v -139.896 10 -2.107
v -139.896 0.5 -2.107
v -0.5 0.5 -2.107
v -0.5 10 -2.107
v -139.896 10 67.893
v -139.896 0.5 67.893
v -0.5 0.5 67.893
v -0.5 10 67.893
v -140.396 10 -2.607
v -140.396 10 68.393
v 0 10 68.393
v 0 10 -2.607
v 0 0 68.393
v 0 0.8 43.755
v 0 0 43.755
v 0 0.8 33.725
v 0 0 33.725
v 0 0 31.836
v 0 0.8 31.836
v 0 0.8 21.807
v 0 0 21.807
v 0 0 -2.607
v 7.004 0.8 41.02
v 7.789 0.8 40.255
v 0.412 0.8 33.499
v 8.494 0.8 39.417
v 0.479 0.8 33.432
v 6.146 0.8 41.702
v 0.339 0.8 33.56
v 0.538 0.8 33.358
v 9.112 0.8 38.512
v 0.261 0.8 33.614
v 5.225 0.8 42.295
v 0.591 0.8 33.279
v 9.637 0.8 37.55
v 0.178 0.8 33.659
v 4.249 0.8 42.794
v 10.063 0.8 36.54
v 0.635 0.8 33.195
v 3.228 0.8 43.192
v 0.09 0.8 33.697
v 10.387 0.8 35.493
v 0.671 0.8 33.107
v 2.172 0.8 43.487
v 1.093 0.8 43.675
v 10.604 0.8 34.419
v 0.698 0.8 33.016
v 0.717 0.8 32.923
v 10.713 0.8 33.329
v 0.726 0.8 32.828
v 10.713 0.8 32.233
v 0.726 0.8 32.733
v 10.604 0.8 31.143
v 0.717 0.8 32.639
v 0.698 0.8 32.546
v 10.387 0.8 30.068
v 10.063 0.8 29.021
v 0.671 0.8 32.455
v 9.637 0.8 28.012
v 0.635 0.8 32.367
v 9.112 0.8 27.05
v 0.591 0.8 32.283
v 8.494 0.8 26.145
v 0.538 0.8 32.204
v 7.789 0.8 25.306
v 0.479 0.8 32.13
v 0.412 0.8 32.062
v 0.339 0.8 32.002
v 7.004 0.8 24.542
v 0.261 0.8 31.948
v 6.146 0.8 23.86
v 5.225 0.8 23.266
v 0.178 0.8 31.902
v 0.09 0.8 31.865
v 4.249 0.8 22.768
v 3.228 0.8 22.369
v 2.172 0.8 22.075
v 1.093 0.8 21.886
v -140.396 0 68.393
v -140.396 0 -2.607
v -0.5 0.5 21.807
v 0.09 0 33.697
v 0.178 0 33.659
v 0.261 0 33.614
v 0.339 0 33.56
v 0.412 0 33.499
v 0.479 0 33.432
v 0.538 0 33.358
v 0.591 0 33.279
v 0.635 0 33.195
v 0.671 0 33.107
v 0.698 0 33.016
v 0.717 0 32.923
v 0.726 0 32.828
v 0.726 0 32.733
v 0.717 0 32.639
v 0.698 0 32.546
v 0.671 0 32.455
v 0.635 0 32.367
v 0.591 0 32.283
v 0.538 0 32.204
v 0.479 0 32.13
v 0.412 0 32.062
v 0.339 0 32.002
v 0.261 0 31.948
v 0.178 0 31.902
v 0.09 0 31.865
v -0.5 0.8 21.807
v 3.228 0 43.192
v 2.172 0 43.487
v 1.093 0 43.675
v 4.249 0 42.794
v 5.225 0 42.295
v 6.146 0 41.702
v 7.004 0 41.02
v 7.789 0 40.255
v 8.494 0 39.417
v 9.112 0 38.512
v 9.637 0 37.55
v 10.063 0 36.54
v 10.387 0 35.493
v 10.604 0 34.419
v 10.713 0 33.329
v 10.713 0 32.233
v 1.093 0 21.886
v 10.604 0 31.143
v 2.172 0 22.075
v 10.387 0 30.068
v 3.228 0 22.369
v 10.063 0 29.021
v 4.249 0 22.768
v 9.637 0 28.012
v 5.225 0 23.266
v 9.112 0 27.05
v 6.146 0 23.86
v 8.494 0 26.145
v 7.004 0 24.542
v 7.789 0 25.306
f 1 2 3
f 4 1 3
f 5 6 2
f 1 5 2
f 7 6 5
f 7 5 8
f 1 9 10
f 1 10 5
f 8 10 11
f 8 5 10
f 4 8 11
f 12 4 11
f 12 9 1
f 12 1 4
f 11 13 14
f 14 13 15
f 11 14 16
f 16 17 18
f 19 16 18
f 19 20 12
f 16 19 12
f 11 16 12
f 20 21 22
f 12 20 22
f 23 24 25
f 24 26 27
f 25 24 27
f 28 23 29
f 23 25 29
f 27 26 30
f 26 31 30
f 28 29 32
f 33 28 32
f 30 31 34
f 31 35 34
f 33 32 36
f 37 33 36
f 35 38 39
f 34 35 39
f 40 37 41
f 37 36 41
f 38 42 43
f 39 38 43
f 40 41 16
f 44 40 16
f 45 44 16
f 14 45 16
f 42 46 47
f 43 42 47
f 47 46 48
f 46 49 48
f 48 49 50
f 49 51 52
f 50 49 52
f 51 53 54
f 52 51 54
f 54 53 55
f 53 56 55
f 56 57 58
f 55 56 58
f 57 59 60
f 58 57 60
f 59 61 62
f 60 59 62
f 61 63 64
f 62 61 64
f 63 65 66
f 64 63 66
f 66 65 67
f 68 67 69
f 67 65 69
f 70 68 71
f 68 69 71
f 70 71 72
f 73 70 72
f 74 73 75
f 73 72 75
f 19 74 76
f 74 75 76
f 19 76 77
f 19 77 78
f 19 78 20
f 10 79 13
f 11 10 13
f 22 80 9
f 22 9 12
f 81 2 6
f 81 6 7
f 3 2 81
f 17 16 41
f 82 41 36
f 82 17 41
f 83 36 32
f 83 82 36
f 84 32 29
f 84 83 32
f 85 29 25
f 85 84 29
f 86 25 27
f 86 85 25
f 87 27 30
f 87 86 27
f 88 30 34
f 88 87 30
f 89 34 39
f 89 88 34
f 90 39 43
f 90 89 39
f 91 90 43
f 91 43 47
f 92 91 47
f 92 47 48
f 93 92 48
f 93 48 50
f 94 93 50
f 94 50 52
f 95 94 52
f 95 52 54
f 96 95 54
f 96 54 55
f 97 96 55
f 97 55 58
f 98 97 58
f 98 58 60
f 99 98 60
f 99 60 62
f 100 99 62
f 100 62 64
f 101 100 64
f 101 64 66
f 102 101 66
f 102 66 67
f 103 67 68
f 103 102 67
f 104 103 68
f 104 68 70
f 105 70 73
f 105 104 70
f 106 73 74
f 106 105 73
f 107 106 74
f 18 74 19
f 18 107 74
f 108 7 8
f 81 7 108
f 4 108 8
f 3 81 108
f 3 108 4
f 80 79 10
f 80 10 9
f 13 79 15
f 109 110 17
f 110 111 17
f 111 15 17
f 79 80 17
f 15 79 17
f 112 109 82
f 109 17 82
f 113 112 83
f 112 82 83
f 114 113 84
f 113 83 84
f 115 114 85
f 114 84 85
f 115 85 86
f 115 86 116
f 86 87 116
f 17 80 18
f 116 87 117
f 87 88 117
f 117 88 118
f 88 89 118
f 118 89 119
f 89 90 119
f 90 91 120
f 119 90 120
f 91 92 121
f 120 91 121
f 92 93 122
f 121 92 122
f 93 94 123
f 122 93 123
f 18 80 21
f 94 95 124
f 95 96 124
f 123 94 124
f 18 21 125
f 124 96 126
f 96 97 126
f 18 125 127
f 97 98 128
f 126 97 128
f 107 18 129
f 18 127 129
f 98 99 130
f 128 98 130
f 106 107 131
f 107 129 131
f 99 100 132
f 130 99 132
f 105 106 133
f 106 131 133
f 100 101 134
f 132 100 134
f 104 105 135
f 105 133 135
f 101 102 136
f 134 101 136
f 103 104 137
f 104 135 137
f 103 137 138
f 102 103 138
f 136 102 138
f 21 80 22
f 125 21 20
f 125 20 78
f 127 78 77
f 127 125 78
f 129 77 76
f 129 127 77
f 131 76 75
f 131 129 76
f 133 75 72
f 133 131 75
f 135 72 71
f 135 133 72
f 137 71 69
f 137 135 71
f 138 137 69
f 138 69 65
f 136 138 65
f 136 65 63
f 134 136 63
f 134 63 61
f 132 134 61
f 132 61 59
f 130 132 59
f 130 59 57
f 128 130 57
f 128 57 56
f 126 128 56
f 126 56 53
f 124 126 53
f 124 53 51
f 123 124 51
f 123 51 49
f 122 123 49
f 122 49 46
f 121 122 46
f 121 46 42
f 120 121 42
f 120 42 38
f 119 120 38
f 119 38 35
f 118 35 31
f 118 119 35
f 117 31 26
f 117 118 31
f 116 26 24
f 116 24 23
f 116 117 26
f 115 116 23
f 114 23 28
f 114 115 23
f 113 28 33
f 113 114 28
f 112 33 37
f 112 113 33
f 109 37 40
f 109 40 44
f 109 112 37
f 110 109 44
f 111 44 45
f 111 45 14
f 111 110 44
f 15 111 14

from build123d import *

# Parameters (mm, degrees)
CROQUIS1_W              = 140.396098848
CROQUIS1_H              = 71.000312846
SALIENTE_EXTRUIR1_DEPTH = 10
VACIADO1_T              = -0.5
EXTRUIR_L_MINA1_DEPTH   = 0.8


with BuildPart() as part:
    # Croquis1 → Saliente-Extruir1 (new body)
    with BuildSketch(Plane(origin=(0, 0, 0), x_dir=(1, 0, 0), z_dir=(0, 1, 0))):
        with Locations((-70.198049424, -32.892800302)):
            Rectangle(CROQUIS1_W, CROQUIS1_H)
    extrude(amount=SALIENTE_EXTRUIR1_DEPTH)

    # Vaciado1
    vaciado1_openings = [part.faces().sort_by_distance(p)[0] for p in [
        (-70.198049424, 10, 32.892800302),
    ]]
    offset(amount=VACIADO1_T, openings=vaciado1_openings, kind=Kind.INTERSECTION)

    # Croquis2 → Extruir-Lámina1 (add)
    with BuildSketch(Plane(origin=(0, 0, 0), x_dir=(1, 0, 0), z_dir=(0, 1, 0))):
        with BuildLine():
            ThreePointArc((-0.5, -21.806712241), (10.724107373, -32.530819614), (0, -43.754926987))
            Line((0, -43.754926987), (-0.227749871, -33.757520824))
            ThreePointArc((-0.227749871, -33.757520824), (0.72670121, -32.758569485), (-0.272250129, -31.804118404))
            Line((-0.272250129, -31.804118404), (-0.5, -21.806712241))
        make_face()
    extrude(amount=EXTRUIR_L_MINA1_DEPTH)


solid = part.part
